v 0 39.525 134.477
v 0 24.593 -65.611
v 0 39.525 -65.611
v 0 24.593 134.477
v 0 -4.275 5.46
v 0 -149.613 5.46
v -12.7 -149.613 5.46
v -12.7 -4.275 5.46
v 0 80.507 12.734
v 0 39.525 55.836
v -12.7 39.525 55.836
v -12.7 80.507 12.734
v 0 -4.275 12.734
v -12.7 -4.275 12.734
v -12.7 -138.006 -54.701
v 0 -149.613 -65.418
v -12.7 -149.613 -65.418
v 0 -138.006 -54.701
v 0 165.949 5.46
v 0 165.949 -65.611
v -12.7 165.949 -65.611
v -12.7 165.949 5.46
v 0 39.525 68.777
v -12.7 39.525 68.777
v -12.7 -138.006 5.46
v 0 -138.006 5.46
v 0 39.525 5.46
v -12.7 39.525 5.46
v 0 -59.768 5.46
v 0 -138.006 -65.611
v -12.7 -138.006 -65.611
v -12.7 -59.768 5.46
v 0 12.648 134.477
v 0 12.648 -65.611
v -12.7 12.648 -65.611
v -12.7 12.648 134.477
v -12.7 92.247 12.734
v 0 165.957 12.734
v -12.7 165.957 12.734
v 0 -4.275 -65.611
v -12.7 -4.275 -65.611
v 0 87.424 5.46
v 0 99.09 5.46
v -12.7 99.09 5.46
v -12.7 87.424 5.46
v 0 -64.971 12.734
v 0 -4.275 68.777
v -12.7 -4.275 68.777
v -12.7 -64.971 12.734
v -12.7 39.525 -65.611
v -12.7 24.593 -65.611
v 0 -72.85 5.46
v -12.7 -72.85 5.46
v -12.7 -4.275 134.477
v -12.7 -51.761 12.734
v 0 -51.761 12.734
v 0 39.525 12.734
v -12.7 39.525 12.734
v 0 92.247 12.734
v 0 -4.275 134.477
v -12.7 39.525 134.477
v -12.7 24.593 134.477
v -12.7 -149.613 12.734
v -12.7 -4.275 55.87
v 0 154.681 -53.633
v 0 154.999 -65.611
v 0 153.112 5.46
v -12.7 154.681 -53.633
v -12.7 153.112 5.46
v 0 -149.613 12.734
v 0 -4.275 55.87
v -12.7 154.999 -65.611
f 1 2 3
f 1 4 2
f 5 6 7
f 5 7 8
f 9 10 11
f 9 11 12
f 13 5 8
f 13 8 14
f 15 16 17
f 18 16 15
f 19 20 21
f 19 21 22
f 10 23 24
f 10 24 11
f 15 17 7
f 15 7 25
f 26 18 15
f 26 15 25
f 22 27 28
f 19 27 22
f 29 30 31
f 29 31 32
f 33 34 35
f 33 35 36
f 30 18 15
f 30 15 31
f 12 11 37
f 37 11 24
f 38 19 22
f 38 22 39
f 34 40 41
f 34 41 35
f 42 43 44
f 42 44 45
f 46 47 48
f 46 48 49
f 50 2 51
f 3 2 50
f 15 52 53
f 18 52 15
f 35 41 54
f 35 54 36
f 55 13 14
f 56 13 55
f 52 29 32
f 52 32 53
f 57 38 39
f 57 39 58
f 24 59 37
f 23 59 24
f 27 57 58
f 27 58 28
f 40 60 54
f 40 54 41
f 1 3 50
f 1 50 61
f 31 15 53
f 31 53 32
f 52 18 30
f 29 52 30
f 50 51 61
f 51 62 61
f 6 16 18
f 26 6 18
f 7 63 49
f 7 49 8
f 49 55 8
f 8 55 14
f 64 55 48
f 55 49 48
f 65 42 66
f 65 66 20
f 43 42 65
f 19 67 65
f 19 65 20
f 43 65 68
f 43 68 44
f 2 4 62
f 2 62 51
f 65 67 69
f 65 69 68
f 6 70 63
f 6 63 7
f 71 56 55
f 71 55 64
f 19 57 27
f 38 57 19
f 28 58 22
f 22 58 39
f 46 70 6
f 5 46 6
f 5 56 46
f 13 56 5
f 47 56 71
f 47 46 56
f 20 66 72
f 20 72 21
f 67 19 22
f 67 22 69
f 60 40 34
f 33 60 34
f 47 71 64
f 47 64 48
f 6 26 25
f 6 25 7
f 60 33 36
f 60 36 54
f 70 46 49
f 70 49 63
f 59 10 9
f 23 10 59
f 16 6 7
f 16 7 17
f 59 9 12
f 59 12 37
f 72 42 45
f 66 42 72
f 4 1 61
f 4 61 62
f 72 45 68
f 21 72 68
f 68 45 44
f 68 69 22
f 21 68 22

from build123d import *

# Parameters (mm, degrees)
F0_W     = 14.9319469929
F0_H     = 71.0706394166
F1_DEPTH = 12.7
F0_W_2   = 16.9228613377
F2_DEPTH = 12.7
F3_DEPTH = 12.7


with BuildPart() as f1:
    # F0 (on Right) → F1 (new body)
    with BuildSketch(Plane.YZ):
        with Locations((32.0592873663, -30.0753683969)):
            Rectangle(F0_W, F0_H)
        Polygon((39.5252608627, 55.8357574791), (39.5252608627, 68.7767677754), (39.5252608627, 134.4773062319), (24.5933138699, 134.4773062319), (24.5933138699, 5.4599513113), (39.5252608627, 5.4599513113), (39.5252608627, 12.7340704948), align=None)
    extrude(amount=-F1_DEPTH)


with BuildPart() as f1b:
    # F0 (on Right) → F1, piece 2 (new body)
    with BuildSketch(Plane.YZ):
        with Locations((4.1863319397, -30.0753683969)):
            Rectangle(F0_W_2, F0_H)
        Polygon((-4.2750987291, 5.4599513113), (12.6477626086, 5.4599513113), (12.6477626086, 134.4773062319), (-4.2750987291, 134.4773062319), (-4.2750987291, 68.7767677754), (-4.2750987291, 55.8700152487), (-4.2750987291, 12.7340704948), align=None)
    extrude(amount=-F1_DEPTH)


with BuildPart() as f1c:
    # F0 (on Right) → F1, piece 3 (new body)
    with BuildSketch(Plane.YZ):
        Polygon((-149.6134943395, 5.4599513113), (-149.6134943395, -65.4183215648), (-138.0058078351, -54.7006132747), (-138.0058078351, 5.4599513113), align=None)
    extrude(amount=-F1_DEPTH)


with BuildPart() as f1d:
    # F0 (on Right) → F1, piece 4 (new body)
    with BuildSketch(Plane.YZ):
        Polygon((165.9490221113, -65.6106881052), (165.9490221113, 5.4599513113), (153.1123422951, 5.4599513113), (154.6809782416, -53.6328468082), align=None)
        Polygon((154.9989336104, -65.6106881052), (165.9490221113, -65.6106881052), (154.6809782416, -53.6328468082), align=None)
        Polygon((154.6809782416, -53.6328468082), (99.0899727268, 5.4599513113), (87.4235696838, 5.4599513113), (154.9989336104, -65.6106881052), align=None)
    extrude(amount=-F1_DEPTH)


with BuildPart() as f1e:
    # F0 (on Right) → F1, piece 5 (new body)
    with BuildSketch(Plane.YZ):
        Polygon((-138.0058078351, -54.7006132747), (-138.0058078351, -65.6106881052), (-59.7684685426, 5.4599513113), (-72.8496238127, 5.4599513113), align=None)
    extrude(amount=-F1_DEPTH)


with BuildPart() as f2:
    # F0 (on Right) → F2 (new body)
    with BuildSketch(Plane.YZ):
        Polygon((-4.2750987291, 68.7767677754), (-64.9714755377, 12.7340704948), (-51.76083367, 12.7340704948), (-4.2750987291, 55.8700152487), align=None)
        Polygon((-149.6134943395, 12.7340704948), (-149.6134943395, 5.4599513113), (-138.0058078351, 5.4599513113), (-72.8496238127, 5.4599513113), (-64.9714755377, 12.7340704948), align=None)
        Polygon((-51.76083367, 12.7340704948), (-59.7684685426, 5.4599513113), (-4.2750987291, 5.4599513113), (-4.2750987291, 12.7340704948), align=None)
        Polygon((-72.8496238127, 5.4599513113), (-59.7684685426, 5.4599513113), (-51.76083367, 12.7340704948), (-64.9714755377, 12.7340704948), align=None)
    extrude(amount=-F2_DEPTH)


with BuildPart() as f2b:
    # F0 (on Right) → F2, piece 2 (new body)
    with BuildSketch(Plane.YZ):
        Polygon((80.5071938765, 12.7340704948), (92.2469121084, 12.7340704948), (39.5252608627, 68.7767677754), (39.5252608627, 55.8357574791), align=None)
    extrude(amount=-F2_DEPTH)


with BuildPart() as f3:
    # F0 (on Right) → F3 (new body)
    with BuildSketch(Plane.YZ):
        Polygon((39.5252608627, 5.4599513113), (87.4235696838, 5.4599513113), (80.5071938765, 12.7340704948), (39.5252608627, 12.7340704948), align=None)
        Polygon((153.1123422951, 5.4599513113), (165.9490221113, 5.4599513113), (165.9567409128, 12.7340704948), (92.2469121084, 12.7340704948), (99.0899727268, 5.4599513113), align=None)
        Polygon((87.4235696838, 5.4599513113), (99.0899727268, 5.4599513113), (92.2469121084, 12.7340704948), (80.5071938765, 12.7340704948), align=None)
    extrude(amount=-F3_DEPTH)


solid = Compound([f1.part, f1b.part, f1c.part, f1d.part, f1e.part, f2.part, f2b.part, f3.part])
